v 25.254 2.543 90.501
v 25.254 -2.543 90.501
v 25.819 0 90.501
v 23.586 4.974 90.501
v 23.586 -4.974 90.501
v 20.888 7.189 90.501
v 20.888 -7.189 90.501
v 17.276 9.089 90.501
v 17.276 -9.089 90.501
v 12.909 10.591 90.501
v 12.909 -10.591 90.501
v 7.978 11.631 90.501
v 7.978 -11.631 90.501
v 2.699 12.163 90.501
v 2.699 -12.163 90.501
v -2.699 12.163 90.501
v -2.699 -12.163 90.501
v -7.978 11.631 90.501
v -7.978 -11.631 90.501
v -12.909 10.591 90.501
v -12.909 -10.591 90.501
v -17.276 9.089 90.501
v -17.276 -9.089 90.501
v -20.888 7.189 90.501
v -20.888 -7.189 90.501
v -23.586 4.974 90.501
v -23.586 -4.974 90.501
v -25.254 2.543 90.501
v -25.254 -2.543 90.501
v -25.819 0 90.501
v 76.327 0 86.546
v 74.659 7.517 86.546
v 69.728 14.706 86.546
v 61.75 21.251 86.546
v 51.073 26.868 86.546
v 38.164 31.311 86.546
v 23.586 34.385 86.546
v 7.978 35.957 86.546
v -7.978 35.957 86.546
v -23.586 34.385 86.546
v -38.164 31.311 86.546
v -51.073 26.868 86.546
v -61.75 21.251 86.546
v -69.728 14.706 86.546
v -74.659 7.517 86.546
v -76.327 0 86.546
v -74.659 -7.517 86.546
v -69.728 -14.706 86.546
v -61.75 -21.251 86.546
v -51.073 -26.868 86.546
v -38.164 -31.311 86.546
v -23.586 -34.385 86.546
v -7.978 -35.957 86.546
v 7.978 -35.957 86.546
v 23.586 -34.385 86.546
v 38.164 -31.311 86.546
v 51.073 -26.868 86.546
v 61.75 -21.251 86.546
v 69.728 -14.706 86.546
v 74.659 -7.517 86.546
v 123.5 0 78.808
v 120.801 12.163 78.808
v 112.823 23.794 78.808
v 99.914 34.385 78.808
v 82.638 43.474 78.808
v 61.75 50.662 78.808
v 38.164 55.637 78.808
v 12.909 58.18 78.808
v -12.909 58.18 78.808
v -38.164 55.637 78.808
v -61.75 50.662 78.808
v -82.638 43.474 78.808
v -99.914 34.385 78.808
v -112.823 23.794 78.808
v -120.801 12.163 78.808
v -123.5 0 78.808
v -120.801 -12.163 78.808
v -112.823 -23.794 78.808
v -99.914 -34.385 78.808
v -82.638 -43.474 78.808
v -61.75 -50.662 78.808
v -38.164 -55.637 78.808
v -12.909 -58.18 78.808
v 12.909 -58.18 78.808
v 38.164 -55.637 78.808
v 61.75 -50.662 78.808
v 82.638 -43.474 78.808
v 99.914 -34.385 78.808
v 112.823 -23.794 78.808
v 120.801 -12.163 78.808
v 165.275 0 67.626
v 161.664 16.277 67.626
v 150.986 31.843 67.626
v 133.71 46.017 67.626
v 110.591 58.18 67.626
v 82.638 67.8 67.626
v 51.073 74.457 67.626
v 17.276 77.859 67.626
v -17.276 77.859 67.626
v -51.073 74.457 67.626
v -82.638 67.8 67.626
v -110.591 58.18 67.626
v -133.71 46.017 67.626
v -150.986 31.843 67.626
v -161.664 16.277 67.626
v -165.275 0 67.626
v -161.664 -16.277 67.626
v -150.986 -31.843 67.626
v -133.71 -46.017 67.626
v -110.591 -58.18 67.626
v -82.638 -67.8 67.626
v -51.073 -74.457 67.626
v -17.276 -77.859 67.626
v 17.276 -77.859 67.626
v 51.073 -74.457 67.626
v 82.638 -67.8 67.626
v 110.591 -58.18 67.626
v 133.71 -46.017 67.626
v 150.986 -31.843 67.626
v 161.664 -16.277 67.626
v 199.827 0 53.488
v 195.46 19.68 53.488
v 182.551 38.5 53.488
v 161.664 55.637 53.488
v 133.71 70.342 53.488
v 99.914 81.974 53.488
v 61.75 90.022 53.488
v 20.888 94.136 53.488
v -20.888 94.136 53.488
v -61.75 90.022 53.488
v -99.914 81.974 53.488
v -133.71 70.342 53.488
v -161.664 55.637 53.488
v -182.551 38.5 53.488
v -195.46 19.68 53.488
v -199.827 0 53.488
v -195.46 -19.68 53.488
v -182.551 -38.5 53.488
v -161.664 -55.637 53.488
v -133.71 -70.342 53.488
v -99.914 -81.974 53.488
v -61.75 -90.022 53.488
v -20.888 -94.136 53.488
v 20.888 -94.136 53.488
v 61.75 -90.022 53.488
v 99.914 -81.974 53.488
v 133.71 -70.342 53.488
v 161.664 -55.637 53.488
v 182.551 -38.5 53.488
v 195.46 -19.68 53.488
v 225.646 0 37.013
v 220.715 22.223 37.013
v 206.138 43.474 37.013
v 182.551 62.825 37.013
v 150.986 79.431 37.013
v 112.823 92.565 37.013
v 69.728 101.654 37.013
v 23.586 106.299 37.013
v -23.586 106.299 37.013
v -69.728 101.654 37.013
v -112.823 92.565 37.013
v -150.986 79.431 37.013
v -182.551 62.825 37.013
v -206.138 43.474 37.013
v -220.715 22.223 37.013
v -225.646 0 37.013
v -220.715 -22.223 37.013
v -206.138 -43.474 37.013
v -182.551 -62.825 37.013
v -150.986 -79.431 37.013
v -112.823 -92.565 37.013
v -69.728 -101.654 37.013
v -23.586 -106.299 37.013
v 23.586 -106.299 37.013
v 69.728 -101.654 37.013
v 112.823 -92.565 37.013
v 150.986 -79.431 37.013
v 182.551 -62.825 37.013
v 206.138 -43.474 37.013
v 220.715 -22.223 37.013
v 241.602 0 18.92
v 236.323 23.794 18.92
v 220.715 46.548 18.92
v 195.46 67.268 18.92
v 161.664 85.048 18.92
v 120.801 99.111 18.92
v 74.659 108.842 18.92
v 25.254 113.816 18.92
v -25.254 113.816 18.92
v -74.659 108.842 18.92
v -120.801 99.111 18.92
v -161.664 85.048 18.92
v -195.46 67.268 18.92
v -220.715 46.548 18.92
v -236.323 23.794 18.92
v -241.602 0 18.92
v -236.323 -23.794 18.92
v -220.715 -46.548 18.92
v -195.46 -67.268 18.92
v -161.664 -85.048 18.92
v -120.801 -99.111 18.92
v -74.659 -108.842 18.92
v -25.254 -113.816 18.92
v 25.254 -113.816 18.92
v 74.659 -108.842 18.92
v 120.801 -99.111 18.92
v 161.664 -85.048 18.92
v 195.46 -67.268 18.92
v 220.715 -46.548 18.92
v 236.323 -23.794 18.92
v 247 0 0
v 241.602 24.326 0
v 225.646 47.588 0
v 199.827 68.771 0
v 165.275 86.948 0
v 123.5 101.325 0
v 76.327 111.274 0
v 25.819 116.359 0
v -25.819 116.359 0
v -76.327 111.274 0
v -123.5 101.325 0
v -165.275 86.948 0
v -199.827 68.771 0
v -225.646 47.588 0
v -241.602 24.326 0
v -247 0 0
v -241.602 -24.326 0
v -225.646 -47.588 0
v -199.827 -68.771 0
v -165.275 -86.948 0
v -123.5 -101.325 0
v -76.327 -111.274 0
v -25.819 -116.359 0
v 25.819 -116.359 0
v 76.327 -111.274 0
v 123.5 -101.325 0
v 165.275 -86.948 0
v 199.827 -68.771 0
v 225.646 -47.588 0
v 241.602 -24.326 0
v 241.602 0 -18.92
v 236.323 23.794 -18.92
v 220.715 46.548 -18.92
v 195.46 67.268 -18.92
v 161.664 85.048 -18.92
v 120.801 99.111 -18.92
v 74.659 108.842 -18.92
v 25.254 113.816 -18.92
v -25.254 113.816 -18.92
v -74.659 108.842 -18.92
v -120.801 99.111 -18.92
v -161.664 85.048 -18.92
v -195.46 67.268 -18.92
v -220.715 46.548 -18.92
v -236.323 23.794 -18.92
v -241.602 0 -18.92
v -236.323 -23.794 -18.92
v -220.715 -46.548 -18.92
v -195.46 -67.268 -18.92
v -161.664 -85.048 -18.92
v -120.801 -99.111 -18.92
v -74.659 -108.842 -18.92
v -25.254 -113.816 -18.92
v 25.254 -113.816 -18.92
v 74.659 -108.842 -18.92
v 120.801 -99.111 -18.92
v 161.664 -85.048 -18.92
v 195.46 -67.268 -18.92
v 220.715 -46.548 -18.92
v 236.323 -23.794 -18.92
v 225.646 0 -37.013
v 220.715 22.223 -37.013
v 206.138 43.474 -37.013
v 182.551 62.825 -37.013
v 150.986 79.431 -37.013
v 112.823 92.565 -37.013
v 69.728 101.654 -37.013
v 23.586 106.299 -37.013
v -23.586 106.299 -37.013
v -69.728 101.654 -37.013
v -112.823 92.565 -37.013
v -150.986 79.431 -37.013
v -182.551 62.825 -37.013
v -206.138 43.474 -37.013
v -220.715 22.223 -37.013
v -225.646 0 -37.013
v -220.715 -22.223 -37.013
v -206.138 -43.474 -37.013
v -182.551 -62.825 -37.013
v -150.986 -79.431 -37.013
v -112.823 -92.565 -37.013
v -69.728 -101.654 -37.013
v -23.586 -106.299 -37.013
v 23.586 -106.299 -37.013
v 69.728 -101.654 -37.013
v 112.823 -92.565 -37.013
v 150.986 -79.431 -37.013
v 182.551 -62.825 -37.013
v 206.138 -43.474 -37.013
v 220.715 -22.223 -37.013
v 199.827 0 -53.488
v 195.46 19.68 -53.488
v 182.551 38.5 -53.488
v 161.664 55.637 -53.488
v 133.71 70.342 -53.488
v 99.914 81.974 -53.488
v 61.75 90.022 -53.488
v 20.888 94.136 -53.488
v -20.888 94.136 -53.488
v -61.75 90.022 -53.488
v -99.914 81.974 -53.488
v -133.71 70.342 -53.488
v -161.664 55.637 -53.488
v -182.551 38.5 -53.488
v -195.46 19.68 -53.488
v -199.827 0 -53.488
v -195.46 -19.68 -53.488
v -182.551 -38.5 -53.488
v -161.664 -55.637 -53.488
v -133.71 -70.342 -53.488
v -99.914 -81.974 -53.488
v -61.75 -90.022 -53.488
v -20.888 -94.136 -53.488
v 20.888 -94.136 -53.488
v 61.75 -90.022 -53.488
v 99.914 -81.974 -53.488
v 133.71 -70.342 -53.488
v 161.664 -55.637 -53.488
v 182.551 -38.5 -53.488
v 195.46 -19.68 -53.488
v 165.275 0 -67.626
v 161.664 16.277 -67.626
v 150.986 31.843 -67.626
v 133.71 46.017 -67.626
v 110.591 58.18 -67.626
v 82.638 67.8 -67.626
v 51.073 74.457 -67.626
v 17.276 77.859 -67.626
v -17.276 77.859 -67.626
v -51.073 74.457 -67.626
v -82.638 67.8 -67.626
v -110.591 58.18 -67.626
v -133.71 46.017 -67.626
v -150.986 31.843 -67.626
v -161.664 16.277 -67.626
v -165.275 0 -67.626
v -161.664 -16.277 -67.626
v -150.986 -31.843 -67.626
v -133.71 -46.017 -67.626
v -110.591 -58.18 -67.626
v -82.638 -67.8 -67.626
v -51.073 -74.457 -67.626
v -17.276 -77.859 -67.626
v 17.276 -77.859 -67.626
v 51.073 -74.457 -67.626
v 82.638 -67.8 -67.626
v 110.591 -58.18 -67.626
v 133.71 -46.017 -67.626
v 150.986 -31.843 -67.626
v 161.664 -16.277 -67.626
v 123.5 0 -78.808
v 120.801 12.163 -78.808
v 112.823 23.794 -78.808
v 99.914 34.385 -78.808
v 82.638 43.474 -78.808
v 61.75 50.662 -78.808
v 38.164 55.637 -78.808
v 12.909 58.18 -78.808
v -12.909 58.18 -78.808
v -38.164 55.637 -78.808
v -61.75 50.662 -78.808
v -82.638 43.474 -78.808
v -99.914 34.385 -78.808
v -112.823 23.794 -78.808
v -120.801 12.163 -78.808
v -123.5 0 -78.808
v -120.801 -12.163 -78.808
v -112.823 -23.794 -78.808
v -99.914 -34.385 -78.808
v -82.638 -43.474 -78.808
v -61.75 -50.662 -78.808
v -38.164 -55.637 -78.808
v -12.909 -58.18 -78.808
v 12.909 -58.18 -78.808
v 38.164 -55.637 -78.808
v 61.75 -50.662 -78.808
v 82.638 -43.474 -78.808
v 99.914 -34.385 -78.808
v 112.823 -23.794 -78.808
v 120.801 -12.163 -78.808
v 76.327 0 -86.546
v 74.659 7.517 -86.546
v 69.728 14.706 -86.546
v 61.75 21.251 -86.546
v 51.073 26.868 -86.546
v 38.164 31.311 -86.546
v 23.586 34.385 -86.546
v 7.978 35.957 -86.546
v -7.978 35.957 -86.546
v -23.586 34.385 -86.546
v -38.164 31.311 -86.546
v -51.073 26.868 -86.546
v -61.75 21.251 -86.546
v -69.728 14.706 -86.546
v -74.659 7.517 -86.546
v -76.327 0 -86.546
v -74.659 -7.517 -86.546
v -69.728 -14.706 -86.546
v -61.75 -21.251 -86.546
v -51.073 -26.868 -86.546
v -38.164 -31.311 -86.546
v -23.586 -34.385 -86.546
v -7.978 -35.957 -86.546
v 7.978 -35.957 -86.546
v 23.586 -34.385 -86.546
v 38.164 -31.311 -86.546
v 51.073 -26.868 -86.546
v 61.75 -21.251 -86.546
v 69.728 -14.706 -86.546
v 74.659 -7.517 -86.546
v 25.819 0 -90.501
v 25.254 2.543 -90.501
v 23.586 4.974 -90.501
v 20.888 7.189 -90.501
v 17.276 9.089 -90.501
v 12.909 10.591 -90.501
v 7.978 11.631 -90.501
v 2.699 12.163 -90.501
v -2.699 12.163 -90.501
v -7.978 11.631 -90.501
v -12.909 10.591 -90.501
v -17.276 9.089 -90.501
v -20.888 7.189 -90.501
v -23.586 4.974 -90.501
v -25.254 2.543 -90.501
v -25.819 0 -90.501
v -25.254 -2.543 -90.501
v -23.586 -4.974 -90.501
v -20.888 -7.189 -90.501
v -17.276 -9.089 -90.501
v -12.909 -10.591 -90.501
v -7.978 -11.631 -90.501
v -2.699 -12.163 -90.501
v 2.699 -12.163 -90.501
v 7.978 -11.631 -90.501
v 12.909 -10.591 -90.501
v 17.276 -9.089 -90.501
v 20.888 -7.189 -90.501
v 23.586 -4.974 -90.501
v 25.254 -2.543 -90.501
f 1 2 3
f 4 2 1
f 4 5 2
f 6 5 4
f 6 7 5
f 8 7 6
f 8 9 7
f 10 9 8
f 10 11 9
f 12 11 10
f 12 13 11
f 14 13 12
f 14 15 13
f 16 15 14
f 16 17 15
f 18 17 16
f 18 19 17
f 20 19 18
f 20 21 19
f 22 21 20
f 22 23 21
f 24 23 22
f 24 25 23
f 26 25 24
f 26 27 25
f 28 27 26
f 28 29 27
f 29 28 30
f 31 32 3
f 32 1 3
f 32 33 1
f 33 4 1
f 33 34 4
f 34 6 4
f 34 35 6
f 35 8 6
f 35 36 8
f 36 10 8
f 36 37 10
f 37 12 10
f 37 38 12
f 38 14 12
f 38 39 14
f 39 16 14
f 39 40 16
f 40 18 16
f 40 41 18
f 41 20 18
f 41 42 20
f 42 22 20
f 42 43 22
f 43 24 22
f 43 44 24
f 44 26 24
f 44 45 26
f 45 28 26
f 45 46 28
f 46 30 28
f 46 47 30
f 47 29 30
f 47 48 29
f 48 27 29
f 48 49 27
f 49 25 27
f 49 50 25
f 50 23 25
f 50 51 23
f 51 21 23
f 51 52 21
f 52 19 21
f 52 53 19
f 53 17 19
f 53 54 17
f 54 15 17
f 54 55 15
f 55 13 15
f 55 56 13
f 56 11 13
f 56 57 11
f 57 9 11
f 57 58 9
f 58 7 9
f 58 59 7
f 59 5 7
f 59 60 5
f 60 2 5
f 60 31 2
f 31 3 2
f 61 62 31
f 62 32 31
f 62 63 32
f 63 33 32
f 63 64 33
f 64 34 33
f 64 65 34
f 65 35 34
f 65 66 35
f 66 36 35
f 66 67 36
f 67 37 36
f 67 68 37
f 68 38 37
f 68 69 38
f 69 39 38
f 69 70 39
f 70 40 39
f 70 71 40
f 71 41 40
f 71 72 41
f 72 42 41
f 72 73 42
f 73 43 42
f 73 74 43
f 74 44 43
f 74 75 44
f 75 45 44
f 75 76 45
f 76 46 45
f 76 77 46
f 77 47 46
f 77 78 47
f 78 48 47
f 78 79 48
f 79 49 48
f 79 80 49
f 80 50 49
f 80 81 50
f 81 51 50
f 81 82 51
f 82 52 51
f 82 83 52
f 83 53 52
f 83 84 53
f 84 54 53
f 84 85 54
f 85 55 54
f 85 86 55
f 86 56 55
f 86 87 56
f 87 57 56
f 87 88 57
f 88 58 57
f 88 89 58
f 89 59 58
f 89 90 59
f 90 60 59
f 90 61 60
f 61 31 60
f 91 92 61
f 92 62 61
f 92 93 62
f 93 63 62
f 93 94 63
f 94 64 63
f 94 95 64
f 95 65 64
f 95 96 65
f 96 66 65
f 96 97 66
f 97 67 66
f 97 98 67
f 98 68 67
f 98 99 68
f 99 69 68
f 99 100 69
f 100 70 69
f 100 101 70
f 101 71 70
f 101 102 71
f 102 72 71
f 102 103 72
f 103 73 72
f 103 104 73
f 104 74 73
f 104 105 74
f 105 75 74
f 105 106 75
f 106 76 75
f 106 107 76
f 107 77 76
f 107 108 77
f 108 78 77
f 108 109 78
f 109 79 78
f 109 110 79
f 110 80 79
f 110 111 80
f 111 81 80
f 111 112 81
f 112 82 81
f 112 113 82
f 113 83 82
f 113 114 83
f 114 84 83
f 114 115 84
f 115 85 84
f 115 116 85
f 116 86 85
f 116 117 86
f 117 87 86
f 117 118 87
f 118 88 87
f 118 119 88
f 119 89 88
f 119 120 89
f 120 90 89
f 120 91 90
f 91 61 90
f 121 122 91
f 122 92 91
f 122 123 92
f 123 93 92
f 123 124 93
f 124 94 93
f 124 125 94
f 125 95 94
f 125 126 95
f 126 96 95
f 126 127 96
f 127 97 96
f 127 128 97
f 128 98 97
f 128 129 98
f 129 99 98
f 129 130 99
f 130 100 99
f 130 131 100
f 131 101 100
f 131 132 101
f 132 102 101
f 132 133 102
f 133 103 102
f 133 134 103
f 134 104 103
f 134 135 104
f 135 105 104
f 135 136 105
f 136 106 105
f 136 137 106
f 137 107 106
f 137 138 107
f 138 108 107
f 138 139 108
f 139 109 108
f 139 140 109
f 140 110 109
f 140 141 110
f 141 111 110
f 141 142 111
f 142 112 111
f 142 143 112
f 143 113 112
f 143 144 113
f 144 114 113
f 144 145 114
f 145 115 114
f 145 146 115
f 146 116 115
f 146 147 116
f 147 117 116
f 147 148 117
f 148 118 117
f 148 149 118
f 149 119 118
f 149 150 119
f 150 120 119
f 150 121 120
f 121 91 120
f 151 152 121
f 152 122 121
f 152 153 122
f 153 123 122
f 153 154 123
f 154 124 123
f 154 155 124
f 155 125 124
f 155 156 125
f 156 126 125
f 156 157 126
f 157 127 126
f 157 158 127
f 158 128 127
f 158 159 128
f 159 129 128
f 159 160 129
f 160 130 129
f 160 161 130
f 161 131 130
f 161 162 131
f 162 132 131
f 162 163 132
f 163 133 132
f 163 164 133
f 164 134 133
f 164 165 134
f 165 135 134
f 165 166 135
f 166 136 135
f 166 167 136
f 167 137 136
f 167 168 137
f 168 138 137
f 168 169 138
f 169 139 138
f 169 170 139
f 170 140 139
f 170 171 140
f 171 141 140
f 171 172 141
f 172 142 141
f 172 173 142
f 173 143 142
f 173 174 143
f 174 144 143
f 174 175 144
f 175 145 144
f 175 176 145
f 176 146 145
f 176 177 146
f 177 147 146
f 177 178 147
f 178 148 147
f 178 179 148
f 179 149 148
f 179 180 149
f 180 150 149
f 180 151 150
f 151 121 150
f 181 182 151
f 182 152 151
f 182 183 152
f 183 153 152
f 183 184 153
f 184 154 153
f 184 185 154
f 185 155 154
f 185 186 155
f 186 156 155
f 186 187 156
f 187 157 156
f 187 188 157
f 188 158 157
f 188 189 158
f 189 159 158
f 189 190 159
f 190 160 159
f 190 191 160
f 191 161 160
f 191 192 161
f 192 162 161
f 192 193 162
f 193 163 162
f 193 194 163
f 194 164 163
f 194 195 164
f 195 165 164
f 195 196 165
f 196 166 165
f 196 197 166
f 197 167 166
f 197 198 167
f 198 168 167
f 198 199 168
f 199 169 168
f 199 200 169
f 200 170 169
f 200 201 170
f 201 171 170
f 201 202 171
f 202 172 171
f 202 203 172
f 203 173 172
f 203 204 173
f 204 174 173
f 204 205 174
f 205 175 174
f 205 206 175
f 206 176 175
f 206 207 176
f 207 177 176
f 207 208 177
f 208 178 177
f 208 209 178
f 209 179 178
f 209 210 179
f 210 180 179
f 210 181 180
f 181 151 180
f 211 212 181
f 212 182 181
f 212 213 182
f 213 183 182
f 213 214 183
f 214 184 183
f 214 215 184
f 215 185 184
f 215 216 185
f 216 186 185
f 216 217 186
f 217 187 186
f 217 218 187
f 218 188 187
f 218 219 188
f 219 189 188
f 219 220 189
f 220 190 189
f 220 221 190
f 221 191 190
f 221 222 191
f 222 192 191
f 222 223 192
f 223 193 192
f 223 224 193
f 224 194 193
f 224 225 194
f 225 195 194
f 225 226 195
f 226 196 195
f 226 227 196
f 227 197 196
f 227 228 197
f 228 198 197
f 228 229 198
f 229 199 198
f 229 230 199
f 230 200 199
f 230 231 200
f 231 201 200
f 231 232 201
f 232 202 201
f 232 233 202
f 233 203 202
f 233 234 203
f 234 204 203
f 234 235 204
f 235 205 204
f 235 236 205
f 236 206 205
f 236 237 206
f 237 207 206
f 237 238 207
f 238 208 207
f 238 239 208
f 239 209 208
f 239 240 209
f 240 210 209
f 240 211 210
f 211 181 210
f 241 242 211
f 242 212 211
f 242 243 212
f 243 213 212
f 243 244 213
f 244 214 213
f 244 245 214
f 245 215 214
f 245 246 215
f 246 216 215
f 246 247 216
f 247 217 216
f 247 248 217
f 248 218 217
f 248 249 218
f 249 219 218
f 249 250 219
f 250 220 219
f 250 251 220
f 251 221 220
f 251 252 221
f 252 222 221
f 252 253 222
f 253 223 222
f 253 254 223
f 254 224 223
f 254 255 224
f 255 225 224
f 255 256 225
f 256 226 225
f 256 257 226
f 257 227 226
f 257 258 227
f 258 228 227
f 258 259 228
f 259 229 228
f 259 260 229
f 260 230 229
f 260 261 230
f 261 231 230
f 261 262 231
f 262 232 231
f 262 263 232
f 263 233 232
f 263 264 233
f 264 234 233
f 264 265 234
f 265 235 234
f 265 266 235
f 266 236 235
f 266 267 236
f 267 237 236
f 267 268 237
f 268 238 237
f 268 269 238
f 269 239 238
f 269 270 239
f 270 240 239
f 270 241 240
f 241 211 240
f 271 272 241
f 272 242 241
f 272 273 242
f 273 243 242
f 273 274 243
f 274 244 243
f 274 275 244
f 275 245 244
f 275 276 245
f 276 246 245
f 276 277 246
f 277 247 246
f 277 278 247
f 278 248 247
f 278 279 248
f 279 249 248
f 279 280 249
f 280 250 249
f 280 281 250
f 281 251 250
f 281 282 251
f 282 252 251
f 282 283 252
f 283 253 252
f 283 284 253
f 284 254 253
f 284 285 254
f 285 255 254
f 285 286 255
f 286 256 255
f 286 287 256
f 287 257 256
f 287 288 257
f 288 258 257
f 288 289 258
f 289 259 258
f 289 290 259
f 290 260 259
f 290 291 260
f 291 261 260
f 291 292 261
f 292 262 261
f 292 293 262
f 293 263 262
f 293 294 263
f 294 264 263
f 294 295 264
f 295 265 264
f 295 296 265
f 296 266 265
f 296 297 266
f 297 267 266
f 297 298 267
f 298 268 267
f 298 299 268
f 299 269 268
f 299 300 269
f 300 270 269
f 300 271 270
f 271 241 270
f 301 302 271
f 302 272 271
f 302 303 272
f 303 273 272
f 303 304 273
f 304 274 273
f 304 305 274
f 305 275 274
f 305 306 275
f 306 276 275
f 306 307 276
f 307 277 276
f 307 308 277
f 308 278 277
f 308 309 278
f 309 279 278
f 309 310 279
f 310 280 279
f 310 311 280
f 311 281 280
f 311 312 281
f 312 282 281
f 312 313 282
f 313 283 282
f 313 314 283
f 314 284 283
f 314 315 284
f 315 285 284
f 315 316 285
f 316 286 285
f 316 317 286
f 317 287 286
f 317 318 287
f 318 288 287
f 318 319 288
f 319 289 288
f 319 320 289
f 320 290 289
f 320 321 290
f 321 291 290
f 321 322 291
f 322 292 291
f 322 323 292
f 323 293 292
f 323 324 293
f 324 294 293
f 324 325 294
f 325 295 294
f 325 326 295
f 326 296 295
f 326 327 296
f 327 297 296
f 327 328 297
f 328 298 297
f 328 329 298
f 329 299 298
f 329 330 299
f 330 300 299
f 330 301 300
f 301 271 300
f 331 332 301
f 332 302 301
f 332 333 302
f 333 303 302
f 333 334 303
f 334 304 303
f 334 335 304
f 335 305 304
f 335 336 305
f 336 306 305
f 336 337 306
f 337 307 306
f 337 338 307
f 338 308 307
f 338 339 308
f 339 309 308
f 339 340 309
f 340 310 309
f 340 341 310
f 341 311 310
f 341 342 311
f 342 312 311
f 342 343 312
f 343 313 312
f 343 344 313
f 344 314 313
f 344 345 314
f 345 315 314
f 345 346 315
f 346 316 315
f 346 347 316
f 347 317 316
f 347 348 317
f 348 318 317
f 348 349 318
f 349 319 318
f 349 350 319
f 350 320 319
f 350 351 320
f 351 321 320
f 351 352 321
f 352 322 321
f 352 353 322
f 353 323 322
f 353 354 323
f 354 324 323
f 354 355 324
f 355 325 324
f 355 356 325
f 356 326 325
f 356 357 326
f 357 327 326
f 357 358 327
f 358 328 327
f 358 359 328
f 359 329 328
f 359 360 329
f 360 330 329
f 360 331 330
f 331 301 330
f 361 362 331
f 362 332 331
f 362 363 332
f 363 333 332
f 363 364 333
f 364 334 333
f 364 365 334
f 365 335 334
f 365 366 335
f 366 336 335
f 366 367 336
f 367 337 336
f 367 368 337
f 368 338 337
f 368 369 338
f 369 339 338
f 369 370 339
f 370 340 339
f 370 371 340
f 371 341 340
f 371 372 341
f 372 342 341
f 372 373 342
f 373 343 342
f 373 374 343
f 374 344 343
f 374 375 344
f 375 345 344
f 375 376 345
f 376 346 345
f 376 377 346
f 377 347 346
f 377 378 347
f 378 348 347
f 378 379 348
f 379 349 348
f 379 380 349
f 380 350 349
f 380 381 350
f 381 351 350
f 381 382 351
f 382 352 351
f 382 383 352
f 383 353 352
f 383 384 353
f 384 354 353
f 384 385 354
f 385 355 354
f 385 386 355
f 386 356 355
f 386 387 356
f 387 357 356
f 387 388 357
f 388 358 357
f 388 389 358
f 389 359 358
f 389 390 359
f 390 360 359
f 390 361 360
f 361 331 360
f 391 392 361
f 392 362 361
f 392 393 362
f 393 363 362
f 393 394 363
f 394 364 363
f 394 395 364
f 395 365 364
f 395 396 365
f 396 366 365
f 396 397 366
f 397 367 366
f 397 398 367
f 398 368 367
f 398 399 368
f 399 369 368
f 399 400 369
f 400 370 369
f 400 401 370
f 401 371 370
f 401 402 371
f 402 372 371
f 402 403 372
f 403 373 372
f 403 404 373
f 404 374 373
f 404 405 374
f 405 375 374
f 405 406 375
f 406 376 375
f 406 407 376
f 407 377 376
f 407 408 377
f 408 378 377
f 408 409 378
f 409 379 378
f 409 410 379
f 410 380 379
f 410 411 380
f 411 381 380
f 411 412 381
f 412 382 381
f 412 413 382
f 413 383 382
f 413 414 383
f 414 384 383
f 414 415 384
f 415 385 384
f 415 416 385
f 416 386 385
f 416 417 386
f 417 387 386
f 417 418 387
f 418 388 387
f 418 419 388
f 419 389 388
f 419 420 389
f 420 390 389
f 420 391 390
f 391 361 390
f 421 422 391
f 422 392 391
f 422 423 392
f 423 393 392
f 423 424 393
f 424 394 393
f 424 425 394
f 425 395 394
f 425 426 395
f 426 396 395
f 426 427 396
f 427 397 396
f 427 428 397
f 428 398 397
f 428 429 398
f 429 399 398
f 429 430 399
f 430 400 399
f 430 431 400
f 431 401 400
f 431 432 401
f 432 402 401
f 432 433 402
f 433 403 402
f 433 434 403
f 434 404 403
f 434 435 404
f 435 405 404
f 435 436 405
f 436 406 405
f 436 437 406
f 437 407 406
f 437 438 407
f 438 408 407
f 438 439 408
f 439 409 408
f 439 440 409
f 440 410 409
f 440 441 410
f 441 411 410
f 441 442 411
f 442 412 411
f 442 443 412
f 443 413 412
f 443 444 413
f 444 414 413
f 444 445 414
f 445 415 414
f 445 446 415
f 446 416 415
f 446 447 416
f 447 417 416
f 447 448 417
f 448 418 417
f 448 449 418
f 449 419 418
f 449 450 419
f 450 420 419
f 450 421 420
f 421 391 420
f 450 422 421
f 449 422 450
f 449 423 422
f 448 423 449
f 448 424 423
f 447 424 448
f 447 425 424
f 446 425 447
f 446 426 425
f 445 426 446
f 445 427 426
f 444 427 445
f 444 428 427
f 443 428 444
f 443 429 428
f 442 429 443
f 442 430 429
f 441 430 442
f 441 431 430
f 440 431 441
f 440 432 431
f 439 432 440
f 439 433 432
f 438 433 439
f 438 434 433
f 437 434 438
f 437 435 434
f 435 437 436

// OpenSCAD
// Generated by SolidPython 1.0.1 on 2020-07-29 00:46:53


scale(v = [19, 9, 7]) {
	sphere(r = 13);
}
/***********************************************
*********      SolidPython code:      **********
************************************************
 
# import packages: SolidPython
from solid import *
from solid.utils import *
from itertools import chain, combinations, permutations


class Resize:

    def __init__(self, scad_file):
        self.scad_file = scad_file
        #self.scad_file = import_scad(scad_file)
        # cone/cylinder param:
        self.r1 = 0
        self.r2 = 0
        self.h = 0
        # rectangular prism param:
        self.w = 0
        self.l = 0
        # ellipse param:
        self.r = 0

    # import OpenScad code (file name corresponds to shape)


    # classify shape + parameters
    def assign(self, param1, param2, param3):
        if self.scad_file == 'cone.scad':
            self.r1 = param1
            self.r2 = param2
            self.h = param3
        elif self.scad_file == 'cylinder.scad':
            self.r1 = param1
            self.r2 = param2
            self.h = param3
        elif self.scad_file == 'rectangularPrism.scad':
            self.h = param1
            self.l = param2
            self.w = param3
        else:
            self.r = param1
            self.h = param2

    # resize parameters
    def iterate(self):
        x = range(3, 20, 2)
        i = 1
        if self.scad_file == 'cone.scad':
            tempList = list(permutations(x, 2))
            for temp in tempList:
                param1 = temp[0]
                param2 = temp[1]
                filepath = 'produced_scad_files/' + 'cone' + str(param1) + '_' + str(param2) + '_' + '.scad'
                scad_render_to_file(cylinder(h=param1, r1=param2, r2=0), filepath)

        elif self.scad_file == 'cylinder.scad':
            tempList = list(permutations(x, 3))
            for temp in tempList:
                param1 = temp[0]
                param2 = temp[1]
                filepath = 'produced_scad_files/' + 'cylinder' + str(param1) + '_' + str(param2) + '_' + '.scad'
                scad_render_to_file(cylinder(h=param1, r1=param2, r2=param2), filepath)

        elif self.scad_file == 'rectangularPrism.scad':
            tempList = list(permutations(x, 3))
            for temp in tempList:
                param1 = temp[0]
                param2 = temp[1]
                param3 = temp[2]
                filepath = 'produced_scad_files/' + 'rectangularPrism' + str(param1) + '_' + str(param2) + '_' + str(
                    param3) + '.scad'
                scad_render_to_file(cube(size=(param1, param2, param3)), filepath)

        elif self.scad_file == 'ellipse.scad':
            tempList = list(permutations(x, 4))
            for temp in tempList:
                param1 = temp[0]
                param2 = temp[1]
                param3 = temp[2]
                param4 = temp[3]
                filepath = 'produced_scad_files/' + 'ellipse' + str(param1) + '_' + str(param2) + '_' + str(param3) + '_' + str(param4) + '.scad'
                scad_render_to_file(scale([param1, param2, param3])(sphere(r=param4)), filepath)

    def render_to_scadfile(self):
        scad_render_to_file(scad, 'example.scad') 
 
************************************************/
